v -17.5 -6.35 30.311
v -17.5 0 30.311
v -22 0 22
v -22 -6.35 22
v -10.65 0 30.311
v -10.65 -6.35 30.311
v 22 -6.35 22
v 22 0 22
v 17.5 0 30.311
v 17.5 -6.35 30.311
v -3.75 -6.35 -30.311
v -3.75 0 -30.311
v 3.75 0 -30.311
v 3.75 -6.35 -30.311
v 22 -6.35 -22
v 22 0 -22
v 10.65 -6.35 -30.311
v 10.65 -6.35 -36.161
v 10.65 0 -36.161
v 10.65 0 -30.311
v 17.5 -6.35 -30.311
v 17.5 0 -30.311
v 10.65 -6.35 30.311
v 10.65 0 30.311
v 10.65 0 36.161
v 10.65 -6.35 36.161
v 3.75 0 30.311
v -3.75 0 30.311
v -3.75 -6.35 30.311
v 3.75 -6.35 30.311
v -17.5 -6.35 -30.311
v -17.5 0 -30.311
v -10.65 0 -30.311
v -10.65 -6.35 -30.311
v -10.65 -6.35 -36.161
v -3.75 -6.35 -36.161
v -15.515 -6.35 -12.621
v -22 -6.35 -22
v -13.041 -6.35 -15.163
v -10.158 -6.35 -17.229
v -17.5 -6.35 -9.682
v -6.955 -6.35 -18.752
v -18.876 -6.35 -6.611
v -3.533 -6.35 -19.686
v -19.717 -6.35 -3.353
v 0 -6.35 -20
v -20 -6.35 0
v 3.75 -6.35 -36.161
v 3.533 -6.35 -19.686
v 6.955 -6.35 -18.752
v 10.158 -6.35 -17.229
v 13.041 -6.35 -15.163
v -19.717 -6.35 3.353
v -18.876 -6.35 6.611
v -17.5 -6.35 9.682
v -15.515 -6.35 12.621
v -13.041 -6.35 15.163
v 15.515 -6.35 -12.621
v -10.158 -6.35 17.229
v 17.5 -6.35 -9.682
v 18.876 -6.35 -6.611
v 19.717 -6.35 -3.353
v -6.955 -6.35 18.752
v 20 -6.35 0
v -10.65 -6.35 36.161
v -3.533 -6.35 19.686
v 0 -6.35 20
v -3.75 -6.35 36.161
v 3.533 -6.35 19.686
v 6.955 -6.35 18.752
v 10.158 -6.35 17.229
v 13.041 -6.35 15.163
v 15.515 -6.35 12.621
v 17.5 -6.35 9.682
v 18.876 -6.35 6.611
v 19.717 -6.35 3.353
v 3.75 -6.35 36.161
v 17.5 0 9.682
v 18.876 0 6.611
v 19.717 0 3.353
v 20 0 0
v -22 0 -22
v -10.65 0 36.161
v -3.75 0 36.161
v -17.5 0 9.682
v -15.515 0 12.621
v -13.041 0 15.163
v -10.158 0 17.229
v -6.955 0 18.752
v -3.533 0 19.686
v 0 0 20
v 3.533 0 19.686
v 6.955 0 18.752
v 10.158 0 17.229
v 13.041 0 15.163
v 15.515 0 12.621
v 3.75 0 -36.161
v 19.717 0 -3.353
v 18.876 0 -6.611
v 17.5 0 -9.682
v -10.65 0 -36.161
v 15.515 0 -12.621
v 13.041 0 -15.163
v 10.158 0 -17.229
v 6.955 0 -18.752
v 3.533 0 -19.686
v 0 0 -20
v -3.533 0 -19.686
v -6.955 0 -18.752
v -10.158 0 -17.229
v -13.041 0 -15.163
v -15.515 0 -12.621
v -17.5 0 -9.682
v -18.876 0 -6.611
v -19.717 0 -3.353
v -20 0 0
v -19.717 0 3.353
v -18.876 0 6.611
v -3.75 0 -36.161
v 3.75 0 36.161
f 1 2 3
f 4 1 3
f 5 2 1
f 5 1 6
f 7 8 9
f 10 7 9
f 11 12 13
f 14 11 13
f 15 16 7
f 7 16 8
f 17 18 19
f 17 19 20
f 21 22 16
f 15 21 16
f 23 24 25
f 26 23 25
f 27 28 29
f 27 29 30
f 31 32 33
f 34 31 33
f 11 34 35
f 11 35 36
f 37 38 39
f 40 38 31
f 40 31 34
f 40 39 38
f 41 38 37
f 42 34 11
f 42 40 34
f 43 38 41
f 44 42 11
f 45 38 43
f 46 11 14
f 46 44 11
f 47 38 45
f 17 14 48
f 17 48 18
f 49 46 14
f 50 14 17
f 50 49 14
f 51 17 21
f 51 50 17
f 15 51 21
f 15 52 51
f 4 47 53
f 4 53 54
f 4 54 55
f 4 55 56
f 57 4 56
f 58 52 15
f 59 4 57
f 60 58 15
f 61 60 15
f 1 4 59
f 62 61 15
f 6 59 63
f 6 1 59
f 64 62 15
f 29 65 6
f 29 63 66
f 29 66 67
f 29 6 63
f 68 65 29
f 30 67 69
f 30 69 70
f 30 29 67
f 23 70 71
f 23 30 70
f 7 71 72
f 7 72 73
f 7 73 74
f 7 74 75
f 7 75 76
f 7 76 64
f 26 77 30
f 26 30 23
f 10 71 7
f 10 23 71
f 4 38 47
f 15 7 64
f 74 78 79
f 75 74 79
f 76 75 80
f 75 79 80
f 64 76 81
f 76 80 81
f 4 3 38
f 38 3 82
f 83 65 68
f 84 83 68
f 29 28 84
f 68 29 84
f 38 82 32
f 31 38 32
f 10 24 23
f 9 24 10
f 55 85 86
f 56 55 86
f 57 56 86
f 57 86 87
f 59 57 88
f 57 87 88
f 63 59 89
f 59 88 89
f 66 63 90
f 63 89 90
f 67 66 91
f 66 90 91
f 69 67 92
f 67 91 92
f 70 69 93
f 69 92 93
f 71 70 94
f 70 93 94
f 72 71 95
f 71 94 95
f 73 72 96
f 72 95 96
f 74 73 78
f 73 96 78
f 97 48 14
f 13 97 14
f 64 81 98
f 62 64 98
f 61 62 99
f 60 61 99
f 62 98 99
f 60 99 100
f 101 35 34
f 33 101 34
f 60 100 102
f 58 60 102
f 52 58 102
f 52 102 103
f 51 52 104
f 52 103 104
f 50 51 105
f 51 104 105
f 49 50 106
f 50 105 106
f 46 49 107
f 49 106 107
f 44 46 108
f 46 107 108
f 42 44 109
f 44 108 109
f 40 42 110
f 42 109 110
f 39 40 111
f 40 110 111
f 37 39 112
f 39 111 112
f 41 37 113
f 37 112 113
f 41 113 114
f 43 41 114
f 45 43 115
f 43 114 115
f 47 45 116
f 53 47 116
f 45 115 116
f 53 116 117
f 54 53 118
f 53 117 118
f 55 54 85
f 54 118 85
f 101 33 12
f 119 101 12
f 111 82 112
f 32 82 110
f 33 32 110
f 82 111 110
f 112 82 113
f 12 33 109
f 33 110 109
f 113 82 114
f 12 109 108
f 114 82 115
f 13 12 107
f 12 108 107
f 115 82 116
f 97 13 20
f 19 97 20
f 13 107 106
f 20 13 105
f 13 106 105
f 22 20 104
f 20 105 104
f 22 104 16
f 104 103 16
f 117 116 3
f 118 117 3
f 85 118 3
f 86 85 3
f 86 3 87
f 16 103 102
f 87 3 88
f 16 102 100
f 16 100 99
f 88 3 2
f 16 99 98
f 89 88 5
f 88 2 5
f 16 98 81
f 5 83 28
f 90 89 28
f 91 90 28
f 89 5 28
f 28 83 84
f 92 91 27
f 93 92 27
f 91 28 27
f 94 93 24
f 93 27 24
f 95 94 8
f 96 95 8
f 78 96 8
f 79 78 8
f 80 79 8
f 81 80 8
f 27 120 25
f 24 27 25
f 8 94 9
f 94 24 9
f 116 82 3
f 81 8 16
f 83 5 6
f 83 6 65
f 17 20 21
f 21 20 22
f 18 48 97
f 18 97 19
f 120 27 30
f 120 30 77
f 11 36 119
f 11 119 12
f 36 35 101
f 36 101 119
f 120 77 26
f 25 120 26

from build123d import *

# Parameters (mm, degrees)
F0_W     = 35
F0_H     = 8.31089
F1_DEPTH = 6.35
F2_W     = 6.9
F2_H     = 5.85
F3_DEPTH = 6.35


# Not quite as in the source:
# - a length typed as a fraction of an inch, garbled in the dataset ("3 / 203.2 mm" for 3/8 in), is restored


with BuildPart() as f1:
    # F0 (on Front) → F1 (new body)
    with BuildSketch(Plane.XZ):
        with BuildLine():
            ThreePointArc((17.5, 9.6824583655), (19.364916731, 5), (20, 0))
            ThreePointArc((20, 0), (19.364916731, -5), (17.5, -9.6824583655))
            Line((17.5, -9.6824583655), (17.5, -22))
            Line((17.5, -22), (22, -22))
            Line((22, -22), (22, 22))
            Line((22, 22), (17.5, 22))
            Line((17.5, 22), (17.5, 9.6824583655))
        make_face()
        with BuildLine():
            ThreePointArc((-17.5, -9.6824583655), (-20, 0), (-17.5, 9.6824583655))
            Line((-17.5, 9.6824583655), (-17.5, 22))
            Line((-17.5, 22), (-22, 22))
            Line((-22, 22), (-22, -22))
            Line((-22, -22), (-17.5, -22))
            Line((-17.5, -22), (-17.5, -9.6824583655))
        make_face()
        with Locations((0, 26.155445)):
            Rectangle(F0_W, F0_H)
        Polygon((17.5, 30.31089), (17.5, 22), (22, 22), align=None)
        Polygon((22, -22), (17.5, -22), (17.5, -30.31089), align=None)
        with Locations((0, -26.155445)):
            Rectangle(F0_W, F0_H)
        Polygon((-22, 22), (-17.5, 22), (-17.5, 30.31089), align=None)
        Polygon((-17.5, -30.31089), (-17.5, -22), (-22, -22), align=None)
        with BuildLine():
            ThreePointArc((-17.5, 9.6824583655), (0, 20), (17.5, 9.6824583655))
            Line((17.5, 9.6824583655), (17.5, 22))
            Line((17.5, 22), (-17.5, 22))
            Line((-17.5, 22), (-17.5, 9.6824583655))
        make_face()
        with BuildLine():
            Line((17.5, -22), (17.5, -9.6824583655))
            ThreePointArc((17.5, -9.6824583655), (0, -20), (-17.5, -9.6824583655))
            Line((-17.5, -9.6824583655), (-17.5, -22))
            Line((-17.5, -22), (17.5, -22))
        make_face()
    extrude(amount=F1_DEPTH)

    # F2 (on face) → F3 (join)
    with BuildSketch(Plane.XZ.offset(6.35)):
        with Locations((-7.2, 33.23589)):
            Rectangle(F2_W, F2_H)
        with Locations((7.2, 33.23589)):
            Rectangle(F2_W, F2_H)
        with Locations((-7.2, -33.23589)):
            Rectangle(F2_W, F2_H)
        with Locations((7.2, -33.23589)):
            Rectangle(F2_W, F2_H)
    extrude(amount=-F3_DEPTH)


solid = f1.part
